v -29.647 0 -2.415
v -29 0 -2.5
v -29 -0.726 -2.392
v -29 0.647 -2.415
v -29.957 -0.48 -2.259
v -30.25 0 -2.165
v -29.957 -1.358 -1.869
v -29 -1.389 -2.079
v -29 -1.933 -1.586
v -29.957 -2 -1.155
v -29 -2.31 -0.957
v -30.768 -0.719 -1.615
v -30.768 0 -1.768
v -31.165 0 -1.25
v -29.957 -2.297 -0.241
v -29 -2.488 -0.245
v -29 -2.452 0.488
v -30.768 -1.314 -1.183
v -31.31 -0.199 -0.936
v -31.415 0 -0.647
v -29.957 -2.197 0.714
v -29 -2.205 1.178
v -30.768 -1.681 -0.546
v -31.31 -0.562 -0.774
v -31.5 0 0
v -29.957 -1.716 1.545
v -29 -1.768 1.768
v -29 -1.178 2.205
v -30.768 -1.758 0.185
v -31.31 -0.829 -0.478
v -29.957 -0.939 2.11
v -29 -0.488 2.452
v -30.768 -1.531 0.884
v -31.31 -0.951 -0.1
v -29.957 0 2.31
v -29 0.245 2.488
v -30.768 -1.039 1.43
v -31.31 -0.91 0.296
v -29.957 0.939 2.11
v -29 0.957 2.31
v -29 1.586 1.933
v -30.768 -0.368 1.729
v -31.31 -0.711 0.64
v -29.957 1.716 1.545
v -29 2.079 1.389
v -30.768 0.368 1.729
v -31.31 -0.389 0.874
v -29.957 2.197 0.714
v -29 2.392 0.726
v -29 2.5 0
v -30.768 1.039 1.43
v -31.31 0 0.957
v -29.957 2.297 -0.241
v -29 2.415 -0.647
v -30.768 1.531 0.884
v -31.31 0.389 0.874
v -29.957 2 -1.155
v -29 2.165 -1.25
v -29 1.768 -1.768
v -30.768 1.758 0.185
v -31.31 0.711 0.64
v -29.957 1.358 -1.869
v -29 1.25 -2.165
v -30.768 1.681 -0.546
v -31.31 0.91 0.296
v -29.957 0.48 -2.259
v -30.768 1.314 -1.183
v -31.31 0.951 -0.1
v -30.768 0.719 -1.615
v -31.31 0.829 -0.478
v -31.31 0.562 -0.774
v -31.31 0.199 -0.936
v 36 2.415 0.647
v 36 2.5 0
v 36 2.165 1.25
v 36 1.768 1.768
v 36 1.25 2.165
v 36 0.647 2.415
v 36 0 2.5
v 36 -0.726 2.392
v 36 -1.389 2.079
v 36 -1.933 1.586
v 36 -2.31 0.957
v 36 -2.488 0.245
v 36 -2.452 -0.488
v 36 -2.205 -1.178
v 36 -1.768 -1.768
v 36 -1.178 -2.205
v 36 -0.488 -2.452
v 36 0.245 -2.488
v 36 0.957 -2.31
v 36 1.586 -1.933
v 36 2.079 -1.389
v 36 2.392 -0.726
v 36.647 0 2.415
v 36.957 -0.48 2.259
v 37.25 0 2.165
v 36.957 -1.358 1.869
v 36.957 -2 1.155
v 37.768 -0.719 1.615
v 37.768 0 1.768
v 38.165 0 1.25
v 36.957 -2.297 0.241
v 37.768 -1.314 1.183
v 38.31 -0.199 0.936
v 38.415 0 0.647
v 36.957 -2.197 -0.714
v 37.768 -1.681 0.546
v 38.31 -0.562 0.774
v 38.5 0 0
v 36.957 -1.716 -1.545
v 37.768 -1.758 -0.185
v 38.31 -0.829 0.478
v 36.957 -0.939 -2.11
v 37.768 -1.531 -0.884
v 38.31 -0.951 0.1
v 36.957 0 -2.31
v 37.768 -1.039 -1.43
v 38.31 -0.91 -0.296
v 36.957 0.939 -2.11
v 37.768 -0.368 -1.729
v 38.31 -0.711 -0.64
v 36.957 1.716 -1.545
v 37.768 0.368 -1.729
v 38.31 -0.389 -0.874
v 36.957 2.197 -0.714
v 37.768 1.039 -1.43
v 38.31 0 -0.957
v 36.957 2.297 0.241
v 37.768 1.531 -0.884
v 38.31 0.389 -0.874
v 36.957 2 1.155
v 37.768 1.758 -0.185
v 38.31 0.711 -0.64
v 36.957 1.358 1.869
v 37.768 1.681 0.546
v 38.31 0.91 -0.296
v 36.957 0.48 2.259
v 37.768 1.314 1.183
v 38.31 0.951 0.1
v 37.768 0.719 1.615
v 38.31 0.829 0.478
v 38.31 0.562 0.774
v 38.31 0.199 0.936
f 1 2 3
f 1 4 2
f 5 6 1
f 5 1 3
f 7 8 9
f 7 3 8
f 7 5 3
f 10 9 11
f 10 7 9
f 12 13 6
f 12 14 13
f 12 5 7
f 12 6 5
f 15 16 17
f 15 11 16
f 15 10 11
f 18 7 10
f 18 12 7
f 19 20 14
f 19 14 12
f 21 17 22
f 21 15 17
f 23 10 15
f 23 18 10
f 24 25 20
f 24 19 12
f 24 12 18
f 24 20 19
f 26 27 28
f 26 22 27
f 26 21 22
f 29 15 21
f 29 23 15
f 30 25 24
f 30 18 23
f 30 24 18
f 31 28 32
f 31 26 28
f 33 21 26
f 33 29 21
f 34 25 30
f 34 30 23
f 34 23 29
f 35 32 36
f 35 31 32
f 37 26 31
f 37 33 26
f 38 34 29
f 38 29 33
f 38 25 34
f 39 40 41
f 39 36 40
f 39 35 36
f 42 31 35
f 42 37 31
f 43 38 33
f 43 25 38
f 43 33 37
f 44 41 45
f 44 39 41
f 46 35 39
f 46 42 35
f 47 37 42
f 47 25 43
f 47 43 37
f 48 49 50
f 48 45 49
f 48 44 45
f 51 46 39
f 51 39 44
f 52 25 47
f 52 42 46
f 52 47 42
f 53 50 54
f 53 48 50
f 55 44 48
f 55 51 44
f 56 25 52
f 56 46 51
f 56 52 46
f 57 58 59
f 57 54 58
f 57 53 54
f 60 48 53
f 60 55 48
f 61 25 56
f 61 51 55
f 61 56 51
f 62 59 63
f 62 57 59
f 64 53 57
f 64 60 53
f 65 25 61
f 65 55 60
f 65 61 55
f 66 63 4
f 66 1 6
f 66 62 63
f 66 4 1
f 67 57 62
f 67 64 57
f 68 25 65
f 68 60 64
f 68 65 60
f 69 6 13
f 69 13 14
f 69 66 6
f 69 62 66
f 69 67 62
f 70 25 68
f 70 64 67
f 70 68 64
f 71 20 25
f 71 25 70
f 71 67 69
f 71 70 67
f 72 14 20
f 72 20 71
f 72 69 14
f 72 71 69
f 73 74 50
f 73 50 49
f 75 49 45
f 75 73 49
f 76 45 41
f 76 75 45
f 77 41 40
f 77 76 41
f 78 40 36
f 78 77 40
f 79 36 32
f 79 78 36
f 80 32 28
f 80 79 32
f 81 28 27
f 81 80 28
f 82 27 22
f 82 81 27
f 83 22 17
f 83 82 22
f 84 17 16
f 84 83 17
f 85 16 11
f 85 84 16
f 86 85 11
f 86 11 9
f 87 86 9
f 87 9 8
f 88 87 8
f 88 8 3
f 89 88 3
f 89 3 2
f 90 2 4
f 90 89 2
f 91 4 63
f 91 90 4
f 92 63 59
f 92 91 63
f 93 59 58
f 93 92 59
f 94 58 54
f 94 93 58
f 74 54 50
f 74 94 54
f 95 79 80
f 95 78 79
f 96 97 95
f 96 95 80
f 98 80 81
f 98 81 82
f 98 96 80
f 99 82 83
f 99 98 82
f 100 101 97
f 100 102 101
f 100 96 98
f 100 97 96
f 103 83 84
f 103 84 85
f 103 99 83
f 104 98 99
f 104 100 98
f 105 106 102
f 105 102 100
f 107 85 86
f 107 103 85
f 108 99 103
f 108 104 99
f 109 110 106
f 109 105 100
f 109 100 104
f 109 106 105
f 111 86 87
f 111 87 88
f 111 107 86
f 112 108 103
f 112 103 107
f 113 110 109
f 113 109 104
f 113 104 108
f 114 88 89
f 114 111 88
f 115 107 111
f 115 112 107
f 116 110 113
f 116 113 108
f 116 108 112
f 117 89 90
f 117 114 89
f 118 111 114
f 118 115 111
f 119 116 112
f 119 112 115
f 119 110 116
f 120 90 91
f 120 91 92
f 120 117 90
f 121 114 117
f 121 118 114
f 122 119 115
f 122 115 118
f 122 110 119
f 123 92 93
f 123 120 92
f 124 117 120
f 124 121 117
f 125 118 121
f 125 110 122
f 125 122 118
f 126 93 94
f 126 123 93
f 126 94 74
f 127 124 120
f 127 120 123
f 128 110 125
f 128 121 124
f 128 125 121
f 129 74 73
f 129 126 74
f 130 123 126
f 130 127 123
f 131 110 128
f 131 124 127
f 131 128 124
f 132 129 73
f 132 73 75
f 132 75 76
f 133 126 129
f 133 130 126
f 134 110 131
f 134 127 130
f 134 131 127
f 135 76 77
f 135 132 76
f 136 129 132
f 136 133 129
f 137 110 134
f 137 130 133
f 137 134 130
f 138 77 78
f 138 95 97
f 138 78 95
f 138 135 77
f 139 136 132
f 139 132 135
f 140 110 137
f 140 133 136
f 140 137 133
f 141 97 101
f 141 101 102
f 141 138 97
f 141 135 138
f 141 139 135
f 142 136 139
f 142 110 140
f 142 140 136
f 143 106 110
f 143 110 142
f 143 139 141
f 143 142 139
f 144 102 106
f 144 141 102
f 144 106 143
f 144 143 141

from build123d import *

# Parameters (mm, degrees)
SKETCH_2_W         = 65
SKETCH_2_H         = 2.5
DOME_3_FACE_RADIUS = 2.5
DOME_3_HEIGHT      = 2.5
DOME_4_FACE_RADIUS = 2.5
DOME_4_HEIGHT      = 2.5


with BuildPart() as part:
    # 草圖2 → 旋轉2 (revolve)
    with BuildSketch(Plane.XY):
        with Locations((3.5, 1.25)):
            Rectangle(SKETCH_2_W, SKETCH_2_H)
    revolve(axis=Axis((-29, 0, 0), (1, 0, 0)))

    # 圓頂3: a dome of height H over a round flat face of radius A is a cap of a sphere of radius (A * A + H * H) / (2 * H)
    dome_3_r = (DOME_3_FACE_RADIUS * DOME_3_FACE_RADIUS + DOME_3_HEIGHT * DOME_3_HEIGHT) / (2 * DOME_3_HEIGHT)
    dome_3_base = Plane((36, 0, 0), z_dir=(1, 0, 0))
    with Locations(dome_3_base.offset(DOME_3_HEIGHT - dome_3_r)):
        dome_3_ball = Sphere(dome_3_r, mode=Mode.PRIVATE)
    add(split(dome_3_ball, bisect_by=dome_3_base, keep=Keep.TOP, mode=Mode.PRIVATE))

    # 圓頂4: a dome of height H over a round flat face of radius A is a cap of a sphere of radius (A * A + H * H) / (2 * H)
    dome_4_r = (DOME_4_FACE_RADIUS * DOME_4_FACE_RADIUS + DOME_4_HEIGHT * DOME_4_HEIGHT) / (2 * DOME_4_HEIGHT)
    dome_4_base = Plane((-29, 0, 0), z_dir=(-1, 0, 0))
    with Locations(dome_4_base.offset(DOME_4_HEIGHT - dome_4_r)):
        dome_4_ball = Sphere(dome_4_r, mode=Mode.PRIVATE)
    add(split(dome_4_ball, bisect_by=dome_4_base, keep=Keep.TOP, mode=Mode.PRIVATE))


solid = part.part
